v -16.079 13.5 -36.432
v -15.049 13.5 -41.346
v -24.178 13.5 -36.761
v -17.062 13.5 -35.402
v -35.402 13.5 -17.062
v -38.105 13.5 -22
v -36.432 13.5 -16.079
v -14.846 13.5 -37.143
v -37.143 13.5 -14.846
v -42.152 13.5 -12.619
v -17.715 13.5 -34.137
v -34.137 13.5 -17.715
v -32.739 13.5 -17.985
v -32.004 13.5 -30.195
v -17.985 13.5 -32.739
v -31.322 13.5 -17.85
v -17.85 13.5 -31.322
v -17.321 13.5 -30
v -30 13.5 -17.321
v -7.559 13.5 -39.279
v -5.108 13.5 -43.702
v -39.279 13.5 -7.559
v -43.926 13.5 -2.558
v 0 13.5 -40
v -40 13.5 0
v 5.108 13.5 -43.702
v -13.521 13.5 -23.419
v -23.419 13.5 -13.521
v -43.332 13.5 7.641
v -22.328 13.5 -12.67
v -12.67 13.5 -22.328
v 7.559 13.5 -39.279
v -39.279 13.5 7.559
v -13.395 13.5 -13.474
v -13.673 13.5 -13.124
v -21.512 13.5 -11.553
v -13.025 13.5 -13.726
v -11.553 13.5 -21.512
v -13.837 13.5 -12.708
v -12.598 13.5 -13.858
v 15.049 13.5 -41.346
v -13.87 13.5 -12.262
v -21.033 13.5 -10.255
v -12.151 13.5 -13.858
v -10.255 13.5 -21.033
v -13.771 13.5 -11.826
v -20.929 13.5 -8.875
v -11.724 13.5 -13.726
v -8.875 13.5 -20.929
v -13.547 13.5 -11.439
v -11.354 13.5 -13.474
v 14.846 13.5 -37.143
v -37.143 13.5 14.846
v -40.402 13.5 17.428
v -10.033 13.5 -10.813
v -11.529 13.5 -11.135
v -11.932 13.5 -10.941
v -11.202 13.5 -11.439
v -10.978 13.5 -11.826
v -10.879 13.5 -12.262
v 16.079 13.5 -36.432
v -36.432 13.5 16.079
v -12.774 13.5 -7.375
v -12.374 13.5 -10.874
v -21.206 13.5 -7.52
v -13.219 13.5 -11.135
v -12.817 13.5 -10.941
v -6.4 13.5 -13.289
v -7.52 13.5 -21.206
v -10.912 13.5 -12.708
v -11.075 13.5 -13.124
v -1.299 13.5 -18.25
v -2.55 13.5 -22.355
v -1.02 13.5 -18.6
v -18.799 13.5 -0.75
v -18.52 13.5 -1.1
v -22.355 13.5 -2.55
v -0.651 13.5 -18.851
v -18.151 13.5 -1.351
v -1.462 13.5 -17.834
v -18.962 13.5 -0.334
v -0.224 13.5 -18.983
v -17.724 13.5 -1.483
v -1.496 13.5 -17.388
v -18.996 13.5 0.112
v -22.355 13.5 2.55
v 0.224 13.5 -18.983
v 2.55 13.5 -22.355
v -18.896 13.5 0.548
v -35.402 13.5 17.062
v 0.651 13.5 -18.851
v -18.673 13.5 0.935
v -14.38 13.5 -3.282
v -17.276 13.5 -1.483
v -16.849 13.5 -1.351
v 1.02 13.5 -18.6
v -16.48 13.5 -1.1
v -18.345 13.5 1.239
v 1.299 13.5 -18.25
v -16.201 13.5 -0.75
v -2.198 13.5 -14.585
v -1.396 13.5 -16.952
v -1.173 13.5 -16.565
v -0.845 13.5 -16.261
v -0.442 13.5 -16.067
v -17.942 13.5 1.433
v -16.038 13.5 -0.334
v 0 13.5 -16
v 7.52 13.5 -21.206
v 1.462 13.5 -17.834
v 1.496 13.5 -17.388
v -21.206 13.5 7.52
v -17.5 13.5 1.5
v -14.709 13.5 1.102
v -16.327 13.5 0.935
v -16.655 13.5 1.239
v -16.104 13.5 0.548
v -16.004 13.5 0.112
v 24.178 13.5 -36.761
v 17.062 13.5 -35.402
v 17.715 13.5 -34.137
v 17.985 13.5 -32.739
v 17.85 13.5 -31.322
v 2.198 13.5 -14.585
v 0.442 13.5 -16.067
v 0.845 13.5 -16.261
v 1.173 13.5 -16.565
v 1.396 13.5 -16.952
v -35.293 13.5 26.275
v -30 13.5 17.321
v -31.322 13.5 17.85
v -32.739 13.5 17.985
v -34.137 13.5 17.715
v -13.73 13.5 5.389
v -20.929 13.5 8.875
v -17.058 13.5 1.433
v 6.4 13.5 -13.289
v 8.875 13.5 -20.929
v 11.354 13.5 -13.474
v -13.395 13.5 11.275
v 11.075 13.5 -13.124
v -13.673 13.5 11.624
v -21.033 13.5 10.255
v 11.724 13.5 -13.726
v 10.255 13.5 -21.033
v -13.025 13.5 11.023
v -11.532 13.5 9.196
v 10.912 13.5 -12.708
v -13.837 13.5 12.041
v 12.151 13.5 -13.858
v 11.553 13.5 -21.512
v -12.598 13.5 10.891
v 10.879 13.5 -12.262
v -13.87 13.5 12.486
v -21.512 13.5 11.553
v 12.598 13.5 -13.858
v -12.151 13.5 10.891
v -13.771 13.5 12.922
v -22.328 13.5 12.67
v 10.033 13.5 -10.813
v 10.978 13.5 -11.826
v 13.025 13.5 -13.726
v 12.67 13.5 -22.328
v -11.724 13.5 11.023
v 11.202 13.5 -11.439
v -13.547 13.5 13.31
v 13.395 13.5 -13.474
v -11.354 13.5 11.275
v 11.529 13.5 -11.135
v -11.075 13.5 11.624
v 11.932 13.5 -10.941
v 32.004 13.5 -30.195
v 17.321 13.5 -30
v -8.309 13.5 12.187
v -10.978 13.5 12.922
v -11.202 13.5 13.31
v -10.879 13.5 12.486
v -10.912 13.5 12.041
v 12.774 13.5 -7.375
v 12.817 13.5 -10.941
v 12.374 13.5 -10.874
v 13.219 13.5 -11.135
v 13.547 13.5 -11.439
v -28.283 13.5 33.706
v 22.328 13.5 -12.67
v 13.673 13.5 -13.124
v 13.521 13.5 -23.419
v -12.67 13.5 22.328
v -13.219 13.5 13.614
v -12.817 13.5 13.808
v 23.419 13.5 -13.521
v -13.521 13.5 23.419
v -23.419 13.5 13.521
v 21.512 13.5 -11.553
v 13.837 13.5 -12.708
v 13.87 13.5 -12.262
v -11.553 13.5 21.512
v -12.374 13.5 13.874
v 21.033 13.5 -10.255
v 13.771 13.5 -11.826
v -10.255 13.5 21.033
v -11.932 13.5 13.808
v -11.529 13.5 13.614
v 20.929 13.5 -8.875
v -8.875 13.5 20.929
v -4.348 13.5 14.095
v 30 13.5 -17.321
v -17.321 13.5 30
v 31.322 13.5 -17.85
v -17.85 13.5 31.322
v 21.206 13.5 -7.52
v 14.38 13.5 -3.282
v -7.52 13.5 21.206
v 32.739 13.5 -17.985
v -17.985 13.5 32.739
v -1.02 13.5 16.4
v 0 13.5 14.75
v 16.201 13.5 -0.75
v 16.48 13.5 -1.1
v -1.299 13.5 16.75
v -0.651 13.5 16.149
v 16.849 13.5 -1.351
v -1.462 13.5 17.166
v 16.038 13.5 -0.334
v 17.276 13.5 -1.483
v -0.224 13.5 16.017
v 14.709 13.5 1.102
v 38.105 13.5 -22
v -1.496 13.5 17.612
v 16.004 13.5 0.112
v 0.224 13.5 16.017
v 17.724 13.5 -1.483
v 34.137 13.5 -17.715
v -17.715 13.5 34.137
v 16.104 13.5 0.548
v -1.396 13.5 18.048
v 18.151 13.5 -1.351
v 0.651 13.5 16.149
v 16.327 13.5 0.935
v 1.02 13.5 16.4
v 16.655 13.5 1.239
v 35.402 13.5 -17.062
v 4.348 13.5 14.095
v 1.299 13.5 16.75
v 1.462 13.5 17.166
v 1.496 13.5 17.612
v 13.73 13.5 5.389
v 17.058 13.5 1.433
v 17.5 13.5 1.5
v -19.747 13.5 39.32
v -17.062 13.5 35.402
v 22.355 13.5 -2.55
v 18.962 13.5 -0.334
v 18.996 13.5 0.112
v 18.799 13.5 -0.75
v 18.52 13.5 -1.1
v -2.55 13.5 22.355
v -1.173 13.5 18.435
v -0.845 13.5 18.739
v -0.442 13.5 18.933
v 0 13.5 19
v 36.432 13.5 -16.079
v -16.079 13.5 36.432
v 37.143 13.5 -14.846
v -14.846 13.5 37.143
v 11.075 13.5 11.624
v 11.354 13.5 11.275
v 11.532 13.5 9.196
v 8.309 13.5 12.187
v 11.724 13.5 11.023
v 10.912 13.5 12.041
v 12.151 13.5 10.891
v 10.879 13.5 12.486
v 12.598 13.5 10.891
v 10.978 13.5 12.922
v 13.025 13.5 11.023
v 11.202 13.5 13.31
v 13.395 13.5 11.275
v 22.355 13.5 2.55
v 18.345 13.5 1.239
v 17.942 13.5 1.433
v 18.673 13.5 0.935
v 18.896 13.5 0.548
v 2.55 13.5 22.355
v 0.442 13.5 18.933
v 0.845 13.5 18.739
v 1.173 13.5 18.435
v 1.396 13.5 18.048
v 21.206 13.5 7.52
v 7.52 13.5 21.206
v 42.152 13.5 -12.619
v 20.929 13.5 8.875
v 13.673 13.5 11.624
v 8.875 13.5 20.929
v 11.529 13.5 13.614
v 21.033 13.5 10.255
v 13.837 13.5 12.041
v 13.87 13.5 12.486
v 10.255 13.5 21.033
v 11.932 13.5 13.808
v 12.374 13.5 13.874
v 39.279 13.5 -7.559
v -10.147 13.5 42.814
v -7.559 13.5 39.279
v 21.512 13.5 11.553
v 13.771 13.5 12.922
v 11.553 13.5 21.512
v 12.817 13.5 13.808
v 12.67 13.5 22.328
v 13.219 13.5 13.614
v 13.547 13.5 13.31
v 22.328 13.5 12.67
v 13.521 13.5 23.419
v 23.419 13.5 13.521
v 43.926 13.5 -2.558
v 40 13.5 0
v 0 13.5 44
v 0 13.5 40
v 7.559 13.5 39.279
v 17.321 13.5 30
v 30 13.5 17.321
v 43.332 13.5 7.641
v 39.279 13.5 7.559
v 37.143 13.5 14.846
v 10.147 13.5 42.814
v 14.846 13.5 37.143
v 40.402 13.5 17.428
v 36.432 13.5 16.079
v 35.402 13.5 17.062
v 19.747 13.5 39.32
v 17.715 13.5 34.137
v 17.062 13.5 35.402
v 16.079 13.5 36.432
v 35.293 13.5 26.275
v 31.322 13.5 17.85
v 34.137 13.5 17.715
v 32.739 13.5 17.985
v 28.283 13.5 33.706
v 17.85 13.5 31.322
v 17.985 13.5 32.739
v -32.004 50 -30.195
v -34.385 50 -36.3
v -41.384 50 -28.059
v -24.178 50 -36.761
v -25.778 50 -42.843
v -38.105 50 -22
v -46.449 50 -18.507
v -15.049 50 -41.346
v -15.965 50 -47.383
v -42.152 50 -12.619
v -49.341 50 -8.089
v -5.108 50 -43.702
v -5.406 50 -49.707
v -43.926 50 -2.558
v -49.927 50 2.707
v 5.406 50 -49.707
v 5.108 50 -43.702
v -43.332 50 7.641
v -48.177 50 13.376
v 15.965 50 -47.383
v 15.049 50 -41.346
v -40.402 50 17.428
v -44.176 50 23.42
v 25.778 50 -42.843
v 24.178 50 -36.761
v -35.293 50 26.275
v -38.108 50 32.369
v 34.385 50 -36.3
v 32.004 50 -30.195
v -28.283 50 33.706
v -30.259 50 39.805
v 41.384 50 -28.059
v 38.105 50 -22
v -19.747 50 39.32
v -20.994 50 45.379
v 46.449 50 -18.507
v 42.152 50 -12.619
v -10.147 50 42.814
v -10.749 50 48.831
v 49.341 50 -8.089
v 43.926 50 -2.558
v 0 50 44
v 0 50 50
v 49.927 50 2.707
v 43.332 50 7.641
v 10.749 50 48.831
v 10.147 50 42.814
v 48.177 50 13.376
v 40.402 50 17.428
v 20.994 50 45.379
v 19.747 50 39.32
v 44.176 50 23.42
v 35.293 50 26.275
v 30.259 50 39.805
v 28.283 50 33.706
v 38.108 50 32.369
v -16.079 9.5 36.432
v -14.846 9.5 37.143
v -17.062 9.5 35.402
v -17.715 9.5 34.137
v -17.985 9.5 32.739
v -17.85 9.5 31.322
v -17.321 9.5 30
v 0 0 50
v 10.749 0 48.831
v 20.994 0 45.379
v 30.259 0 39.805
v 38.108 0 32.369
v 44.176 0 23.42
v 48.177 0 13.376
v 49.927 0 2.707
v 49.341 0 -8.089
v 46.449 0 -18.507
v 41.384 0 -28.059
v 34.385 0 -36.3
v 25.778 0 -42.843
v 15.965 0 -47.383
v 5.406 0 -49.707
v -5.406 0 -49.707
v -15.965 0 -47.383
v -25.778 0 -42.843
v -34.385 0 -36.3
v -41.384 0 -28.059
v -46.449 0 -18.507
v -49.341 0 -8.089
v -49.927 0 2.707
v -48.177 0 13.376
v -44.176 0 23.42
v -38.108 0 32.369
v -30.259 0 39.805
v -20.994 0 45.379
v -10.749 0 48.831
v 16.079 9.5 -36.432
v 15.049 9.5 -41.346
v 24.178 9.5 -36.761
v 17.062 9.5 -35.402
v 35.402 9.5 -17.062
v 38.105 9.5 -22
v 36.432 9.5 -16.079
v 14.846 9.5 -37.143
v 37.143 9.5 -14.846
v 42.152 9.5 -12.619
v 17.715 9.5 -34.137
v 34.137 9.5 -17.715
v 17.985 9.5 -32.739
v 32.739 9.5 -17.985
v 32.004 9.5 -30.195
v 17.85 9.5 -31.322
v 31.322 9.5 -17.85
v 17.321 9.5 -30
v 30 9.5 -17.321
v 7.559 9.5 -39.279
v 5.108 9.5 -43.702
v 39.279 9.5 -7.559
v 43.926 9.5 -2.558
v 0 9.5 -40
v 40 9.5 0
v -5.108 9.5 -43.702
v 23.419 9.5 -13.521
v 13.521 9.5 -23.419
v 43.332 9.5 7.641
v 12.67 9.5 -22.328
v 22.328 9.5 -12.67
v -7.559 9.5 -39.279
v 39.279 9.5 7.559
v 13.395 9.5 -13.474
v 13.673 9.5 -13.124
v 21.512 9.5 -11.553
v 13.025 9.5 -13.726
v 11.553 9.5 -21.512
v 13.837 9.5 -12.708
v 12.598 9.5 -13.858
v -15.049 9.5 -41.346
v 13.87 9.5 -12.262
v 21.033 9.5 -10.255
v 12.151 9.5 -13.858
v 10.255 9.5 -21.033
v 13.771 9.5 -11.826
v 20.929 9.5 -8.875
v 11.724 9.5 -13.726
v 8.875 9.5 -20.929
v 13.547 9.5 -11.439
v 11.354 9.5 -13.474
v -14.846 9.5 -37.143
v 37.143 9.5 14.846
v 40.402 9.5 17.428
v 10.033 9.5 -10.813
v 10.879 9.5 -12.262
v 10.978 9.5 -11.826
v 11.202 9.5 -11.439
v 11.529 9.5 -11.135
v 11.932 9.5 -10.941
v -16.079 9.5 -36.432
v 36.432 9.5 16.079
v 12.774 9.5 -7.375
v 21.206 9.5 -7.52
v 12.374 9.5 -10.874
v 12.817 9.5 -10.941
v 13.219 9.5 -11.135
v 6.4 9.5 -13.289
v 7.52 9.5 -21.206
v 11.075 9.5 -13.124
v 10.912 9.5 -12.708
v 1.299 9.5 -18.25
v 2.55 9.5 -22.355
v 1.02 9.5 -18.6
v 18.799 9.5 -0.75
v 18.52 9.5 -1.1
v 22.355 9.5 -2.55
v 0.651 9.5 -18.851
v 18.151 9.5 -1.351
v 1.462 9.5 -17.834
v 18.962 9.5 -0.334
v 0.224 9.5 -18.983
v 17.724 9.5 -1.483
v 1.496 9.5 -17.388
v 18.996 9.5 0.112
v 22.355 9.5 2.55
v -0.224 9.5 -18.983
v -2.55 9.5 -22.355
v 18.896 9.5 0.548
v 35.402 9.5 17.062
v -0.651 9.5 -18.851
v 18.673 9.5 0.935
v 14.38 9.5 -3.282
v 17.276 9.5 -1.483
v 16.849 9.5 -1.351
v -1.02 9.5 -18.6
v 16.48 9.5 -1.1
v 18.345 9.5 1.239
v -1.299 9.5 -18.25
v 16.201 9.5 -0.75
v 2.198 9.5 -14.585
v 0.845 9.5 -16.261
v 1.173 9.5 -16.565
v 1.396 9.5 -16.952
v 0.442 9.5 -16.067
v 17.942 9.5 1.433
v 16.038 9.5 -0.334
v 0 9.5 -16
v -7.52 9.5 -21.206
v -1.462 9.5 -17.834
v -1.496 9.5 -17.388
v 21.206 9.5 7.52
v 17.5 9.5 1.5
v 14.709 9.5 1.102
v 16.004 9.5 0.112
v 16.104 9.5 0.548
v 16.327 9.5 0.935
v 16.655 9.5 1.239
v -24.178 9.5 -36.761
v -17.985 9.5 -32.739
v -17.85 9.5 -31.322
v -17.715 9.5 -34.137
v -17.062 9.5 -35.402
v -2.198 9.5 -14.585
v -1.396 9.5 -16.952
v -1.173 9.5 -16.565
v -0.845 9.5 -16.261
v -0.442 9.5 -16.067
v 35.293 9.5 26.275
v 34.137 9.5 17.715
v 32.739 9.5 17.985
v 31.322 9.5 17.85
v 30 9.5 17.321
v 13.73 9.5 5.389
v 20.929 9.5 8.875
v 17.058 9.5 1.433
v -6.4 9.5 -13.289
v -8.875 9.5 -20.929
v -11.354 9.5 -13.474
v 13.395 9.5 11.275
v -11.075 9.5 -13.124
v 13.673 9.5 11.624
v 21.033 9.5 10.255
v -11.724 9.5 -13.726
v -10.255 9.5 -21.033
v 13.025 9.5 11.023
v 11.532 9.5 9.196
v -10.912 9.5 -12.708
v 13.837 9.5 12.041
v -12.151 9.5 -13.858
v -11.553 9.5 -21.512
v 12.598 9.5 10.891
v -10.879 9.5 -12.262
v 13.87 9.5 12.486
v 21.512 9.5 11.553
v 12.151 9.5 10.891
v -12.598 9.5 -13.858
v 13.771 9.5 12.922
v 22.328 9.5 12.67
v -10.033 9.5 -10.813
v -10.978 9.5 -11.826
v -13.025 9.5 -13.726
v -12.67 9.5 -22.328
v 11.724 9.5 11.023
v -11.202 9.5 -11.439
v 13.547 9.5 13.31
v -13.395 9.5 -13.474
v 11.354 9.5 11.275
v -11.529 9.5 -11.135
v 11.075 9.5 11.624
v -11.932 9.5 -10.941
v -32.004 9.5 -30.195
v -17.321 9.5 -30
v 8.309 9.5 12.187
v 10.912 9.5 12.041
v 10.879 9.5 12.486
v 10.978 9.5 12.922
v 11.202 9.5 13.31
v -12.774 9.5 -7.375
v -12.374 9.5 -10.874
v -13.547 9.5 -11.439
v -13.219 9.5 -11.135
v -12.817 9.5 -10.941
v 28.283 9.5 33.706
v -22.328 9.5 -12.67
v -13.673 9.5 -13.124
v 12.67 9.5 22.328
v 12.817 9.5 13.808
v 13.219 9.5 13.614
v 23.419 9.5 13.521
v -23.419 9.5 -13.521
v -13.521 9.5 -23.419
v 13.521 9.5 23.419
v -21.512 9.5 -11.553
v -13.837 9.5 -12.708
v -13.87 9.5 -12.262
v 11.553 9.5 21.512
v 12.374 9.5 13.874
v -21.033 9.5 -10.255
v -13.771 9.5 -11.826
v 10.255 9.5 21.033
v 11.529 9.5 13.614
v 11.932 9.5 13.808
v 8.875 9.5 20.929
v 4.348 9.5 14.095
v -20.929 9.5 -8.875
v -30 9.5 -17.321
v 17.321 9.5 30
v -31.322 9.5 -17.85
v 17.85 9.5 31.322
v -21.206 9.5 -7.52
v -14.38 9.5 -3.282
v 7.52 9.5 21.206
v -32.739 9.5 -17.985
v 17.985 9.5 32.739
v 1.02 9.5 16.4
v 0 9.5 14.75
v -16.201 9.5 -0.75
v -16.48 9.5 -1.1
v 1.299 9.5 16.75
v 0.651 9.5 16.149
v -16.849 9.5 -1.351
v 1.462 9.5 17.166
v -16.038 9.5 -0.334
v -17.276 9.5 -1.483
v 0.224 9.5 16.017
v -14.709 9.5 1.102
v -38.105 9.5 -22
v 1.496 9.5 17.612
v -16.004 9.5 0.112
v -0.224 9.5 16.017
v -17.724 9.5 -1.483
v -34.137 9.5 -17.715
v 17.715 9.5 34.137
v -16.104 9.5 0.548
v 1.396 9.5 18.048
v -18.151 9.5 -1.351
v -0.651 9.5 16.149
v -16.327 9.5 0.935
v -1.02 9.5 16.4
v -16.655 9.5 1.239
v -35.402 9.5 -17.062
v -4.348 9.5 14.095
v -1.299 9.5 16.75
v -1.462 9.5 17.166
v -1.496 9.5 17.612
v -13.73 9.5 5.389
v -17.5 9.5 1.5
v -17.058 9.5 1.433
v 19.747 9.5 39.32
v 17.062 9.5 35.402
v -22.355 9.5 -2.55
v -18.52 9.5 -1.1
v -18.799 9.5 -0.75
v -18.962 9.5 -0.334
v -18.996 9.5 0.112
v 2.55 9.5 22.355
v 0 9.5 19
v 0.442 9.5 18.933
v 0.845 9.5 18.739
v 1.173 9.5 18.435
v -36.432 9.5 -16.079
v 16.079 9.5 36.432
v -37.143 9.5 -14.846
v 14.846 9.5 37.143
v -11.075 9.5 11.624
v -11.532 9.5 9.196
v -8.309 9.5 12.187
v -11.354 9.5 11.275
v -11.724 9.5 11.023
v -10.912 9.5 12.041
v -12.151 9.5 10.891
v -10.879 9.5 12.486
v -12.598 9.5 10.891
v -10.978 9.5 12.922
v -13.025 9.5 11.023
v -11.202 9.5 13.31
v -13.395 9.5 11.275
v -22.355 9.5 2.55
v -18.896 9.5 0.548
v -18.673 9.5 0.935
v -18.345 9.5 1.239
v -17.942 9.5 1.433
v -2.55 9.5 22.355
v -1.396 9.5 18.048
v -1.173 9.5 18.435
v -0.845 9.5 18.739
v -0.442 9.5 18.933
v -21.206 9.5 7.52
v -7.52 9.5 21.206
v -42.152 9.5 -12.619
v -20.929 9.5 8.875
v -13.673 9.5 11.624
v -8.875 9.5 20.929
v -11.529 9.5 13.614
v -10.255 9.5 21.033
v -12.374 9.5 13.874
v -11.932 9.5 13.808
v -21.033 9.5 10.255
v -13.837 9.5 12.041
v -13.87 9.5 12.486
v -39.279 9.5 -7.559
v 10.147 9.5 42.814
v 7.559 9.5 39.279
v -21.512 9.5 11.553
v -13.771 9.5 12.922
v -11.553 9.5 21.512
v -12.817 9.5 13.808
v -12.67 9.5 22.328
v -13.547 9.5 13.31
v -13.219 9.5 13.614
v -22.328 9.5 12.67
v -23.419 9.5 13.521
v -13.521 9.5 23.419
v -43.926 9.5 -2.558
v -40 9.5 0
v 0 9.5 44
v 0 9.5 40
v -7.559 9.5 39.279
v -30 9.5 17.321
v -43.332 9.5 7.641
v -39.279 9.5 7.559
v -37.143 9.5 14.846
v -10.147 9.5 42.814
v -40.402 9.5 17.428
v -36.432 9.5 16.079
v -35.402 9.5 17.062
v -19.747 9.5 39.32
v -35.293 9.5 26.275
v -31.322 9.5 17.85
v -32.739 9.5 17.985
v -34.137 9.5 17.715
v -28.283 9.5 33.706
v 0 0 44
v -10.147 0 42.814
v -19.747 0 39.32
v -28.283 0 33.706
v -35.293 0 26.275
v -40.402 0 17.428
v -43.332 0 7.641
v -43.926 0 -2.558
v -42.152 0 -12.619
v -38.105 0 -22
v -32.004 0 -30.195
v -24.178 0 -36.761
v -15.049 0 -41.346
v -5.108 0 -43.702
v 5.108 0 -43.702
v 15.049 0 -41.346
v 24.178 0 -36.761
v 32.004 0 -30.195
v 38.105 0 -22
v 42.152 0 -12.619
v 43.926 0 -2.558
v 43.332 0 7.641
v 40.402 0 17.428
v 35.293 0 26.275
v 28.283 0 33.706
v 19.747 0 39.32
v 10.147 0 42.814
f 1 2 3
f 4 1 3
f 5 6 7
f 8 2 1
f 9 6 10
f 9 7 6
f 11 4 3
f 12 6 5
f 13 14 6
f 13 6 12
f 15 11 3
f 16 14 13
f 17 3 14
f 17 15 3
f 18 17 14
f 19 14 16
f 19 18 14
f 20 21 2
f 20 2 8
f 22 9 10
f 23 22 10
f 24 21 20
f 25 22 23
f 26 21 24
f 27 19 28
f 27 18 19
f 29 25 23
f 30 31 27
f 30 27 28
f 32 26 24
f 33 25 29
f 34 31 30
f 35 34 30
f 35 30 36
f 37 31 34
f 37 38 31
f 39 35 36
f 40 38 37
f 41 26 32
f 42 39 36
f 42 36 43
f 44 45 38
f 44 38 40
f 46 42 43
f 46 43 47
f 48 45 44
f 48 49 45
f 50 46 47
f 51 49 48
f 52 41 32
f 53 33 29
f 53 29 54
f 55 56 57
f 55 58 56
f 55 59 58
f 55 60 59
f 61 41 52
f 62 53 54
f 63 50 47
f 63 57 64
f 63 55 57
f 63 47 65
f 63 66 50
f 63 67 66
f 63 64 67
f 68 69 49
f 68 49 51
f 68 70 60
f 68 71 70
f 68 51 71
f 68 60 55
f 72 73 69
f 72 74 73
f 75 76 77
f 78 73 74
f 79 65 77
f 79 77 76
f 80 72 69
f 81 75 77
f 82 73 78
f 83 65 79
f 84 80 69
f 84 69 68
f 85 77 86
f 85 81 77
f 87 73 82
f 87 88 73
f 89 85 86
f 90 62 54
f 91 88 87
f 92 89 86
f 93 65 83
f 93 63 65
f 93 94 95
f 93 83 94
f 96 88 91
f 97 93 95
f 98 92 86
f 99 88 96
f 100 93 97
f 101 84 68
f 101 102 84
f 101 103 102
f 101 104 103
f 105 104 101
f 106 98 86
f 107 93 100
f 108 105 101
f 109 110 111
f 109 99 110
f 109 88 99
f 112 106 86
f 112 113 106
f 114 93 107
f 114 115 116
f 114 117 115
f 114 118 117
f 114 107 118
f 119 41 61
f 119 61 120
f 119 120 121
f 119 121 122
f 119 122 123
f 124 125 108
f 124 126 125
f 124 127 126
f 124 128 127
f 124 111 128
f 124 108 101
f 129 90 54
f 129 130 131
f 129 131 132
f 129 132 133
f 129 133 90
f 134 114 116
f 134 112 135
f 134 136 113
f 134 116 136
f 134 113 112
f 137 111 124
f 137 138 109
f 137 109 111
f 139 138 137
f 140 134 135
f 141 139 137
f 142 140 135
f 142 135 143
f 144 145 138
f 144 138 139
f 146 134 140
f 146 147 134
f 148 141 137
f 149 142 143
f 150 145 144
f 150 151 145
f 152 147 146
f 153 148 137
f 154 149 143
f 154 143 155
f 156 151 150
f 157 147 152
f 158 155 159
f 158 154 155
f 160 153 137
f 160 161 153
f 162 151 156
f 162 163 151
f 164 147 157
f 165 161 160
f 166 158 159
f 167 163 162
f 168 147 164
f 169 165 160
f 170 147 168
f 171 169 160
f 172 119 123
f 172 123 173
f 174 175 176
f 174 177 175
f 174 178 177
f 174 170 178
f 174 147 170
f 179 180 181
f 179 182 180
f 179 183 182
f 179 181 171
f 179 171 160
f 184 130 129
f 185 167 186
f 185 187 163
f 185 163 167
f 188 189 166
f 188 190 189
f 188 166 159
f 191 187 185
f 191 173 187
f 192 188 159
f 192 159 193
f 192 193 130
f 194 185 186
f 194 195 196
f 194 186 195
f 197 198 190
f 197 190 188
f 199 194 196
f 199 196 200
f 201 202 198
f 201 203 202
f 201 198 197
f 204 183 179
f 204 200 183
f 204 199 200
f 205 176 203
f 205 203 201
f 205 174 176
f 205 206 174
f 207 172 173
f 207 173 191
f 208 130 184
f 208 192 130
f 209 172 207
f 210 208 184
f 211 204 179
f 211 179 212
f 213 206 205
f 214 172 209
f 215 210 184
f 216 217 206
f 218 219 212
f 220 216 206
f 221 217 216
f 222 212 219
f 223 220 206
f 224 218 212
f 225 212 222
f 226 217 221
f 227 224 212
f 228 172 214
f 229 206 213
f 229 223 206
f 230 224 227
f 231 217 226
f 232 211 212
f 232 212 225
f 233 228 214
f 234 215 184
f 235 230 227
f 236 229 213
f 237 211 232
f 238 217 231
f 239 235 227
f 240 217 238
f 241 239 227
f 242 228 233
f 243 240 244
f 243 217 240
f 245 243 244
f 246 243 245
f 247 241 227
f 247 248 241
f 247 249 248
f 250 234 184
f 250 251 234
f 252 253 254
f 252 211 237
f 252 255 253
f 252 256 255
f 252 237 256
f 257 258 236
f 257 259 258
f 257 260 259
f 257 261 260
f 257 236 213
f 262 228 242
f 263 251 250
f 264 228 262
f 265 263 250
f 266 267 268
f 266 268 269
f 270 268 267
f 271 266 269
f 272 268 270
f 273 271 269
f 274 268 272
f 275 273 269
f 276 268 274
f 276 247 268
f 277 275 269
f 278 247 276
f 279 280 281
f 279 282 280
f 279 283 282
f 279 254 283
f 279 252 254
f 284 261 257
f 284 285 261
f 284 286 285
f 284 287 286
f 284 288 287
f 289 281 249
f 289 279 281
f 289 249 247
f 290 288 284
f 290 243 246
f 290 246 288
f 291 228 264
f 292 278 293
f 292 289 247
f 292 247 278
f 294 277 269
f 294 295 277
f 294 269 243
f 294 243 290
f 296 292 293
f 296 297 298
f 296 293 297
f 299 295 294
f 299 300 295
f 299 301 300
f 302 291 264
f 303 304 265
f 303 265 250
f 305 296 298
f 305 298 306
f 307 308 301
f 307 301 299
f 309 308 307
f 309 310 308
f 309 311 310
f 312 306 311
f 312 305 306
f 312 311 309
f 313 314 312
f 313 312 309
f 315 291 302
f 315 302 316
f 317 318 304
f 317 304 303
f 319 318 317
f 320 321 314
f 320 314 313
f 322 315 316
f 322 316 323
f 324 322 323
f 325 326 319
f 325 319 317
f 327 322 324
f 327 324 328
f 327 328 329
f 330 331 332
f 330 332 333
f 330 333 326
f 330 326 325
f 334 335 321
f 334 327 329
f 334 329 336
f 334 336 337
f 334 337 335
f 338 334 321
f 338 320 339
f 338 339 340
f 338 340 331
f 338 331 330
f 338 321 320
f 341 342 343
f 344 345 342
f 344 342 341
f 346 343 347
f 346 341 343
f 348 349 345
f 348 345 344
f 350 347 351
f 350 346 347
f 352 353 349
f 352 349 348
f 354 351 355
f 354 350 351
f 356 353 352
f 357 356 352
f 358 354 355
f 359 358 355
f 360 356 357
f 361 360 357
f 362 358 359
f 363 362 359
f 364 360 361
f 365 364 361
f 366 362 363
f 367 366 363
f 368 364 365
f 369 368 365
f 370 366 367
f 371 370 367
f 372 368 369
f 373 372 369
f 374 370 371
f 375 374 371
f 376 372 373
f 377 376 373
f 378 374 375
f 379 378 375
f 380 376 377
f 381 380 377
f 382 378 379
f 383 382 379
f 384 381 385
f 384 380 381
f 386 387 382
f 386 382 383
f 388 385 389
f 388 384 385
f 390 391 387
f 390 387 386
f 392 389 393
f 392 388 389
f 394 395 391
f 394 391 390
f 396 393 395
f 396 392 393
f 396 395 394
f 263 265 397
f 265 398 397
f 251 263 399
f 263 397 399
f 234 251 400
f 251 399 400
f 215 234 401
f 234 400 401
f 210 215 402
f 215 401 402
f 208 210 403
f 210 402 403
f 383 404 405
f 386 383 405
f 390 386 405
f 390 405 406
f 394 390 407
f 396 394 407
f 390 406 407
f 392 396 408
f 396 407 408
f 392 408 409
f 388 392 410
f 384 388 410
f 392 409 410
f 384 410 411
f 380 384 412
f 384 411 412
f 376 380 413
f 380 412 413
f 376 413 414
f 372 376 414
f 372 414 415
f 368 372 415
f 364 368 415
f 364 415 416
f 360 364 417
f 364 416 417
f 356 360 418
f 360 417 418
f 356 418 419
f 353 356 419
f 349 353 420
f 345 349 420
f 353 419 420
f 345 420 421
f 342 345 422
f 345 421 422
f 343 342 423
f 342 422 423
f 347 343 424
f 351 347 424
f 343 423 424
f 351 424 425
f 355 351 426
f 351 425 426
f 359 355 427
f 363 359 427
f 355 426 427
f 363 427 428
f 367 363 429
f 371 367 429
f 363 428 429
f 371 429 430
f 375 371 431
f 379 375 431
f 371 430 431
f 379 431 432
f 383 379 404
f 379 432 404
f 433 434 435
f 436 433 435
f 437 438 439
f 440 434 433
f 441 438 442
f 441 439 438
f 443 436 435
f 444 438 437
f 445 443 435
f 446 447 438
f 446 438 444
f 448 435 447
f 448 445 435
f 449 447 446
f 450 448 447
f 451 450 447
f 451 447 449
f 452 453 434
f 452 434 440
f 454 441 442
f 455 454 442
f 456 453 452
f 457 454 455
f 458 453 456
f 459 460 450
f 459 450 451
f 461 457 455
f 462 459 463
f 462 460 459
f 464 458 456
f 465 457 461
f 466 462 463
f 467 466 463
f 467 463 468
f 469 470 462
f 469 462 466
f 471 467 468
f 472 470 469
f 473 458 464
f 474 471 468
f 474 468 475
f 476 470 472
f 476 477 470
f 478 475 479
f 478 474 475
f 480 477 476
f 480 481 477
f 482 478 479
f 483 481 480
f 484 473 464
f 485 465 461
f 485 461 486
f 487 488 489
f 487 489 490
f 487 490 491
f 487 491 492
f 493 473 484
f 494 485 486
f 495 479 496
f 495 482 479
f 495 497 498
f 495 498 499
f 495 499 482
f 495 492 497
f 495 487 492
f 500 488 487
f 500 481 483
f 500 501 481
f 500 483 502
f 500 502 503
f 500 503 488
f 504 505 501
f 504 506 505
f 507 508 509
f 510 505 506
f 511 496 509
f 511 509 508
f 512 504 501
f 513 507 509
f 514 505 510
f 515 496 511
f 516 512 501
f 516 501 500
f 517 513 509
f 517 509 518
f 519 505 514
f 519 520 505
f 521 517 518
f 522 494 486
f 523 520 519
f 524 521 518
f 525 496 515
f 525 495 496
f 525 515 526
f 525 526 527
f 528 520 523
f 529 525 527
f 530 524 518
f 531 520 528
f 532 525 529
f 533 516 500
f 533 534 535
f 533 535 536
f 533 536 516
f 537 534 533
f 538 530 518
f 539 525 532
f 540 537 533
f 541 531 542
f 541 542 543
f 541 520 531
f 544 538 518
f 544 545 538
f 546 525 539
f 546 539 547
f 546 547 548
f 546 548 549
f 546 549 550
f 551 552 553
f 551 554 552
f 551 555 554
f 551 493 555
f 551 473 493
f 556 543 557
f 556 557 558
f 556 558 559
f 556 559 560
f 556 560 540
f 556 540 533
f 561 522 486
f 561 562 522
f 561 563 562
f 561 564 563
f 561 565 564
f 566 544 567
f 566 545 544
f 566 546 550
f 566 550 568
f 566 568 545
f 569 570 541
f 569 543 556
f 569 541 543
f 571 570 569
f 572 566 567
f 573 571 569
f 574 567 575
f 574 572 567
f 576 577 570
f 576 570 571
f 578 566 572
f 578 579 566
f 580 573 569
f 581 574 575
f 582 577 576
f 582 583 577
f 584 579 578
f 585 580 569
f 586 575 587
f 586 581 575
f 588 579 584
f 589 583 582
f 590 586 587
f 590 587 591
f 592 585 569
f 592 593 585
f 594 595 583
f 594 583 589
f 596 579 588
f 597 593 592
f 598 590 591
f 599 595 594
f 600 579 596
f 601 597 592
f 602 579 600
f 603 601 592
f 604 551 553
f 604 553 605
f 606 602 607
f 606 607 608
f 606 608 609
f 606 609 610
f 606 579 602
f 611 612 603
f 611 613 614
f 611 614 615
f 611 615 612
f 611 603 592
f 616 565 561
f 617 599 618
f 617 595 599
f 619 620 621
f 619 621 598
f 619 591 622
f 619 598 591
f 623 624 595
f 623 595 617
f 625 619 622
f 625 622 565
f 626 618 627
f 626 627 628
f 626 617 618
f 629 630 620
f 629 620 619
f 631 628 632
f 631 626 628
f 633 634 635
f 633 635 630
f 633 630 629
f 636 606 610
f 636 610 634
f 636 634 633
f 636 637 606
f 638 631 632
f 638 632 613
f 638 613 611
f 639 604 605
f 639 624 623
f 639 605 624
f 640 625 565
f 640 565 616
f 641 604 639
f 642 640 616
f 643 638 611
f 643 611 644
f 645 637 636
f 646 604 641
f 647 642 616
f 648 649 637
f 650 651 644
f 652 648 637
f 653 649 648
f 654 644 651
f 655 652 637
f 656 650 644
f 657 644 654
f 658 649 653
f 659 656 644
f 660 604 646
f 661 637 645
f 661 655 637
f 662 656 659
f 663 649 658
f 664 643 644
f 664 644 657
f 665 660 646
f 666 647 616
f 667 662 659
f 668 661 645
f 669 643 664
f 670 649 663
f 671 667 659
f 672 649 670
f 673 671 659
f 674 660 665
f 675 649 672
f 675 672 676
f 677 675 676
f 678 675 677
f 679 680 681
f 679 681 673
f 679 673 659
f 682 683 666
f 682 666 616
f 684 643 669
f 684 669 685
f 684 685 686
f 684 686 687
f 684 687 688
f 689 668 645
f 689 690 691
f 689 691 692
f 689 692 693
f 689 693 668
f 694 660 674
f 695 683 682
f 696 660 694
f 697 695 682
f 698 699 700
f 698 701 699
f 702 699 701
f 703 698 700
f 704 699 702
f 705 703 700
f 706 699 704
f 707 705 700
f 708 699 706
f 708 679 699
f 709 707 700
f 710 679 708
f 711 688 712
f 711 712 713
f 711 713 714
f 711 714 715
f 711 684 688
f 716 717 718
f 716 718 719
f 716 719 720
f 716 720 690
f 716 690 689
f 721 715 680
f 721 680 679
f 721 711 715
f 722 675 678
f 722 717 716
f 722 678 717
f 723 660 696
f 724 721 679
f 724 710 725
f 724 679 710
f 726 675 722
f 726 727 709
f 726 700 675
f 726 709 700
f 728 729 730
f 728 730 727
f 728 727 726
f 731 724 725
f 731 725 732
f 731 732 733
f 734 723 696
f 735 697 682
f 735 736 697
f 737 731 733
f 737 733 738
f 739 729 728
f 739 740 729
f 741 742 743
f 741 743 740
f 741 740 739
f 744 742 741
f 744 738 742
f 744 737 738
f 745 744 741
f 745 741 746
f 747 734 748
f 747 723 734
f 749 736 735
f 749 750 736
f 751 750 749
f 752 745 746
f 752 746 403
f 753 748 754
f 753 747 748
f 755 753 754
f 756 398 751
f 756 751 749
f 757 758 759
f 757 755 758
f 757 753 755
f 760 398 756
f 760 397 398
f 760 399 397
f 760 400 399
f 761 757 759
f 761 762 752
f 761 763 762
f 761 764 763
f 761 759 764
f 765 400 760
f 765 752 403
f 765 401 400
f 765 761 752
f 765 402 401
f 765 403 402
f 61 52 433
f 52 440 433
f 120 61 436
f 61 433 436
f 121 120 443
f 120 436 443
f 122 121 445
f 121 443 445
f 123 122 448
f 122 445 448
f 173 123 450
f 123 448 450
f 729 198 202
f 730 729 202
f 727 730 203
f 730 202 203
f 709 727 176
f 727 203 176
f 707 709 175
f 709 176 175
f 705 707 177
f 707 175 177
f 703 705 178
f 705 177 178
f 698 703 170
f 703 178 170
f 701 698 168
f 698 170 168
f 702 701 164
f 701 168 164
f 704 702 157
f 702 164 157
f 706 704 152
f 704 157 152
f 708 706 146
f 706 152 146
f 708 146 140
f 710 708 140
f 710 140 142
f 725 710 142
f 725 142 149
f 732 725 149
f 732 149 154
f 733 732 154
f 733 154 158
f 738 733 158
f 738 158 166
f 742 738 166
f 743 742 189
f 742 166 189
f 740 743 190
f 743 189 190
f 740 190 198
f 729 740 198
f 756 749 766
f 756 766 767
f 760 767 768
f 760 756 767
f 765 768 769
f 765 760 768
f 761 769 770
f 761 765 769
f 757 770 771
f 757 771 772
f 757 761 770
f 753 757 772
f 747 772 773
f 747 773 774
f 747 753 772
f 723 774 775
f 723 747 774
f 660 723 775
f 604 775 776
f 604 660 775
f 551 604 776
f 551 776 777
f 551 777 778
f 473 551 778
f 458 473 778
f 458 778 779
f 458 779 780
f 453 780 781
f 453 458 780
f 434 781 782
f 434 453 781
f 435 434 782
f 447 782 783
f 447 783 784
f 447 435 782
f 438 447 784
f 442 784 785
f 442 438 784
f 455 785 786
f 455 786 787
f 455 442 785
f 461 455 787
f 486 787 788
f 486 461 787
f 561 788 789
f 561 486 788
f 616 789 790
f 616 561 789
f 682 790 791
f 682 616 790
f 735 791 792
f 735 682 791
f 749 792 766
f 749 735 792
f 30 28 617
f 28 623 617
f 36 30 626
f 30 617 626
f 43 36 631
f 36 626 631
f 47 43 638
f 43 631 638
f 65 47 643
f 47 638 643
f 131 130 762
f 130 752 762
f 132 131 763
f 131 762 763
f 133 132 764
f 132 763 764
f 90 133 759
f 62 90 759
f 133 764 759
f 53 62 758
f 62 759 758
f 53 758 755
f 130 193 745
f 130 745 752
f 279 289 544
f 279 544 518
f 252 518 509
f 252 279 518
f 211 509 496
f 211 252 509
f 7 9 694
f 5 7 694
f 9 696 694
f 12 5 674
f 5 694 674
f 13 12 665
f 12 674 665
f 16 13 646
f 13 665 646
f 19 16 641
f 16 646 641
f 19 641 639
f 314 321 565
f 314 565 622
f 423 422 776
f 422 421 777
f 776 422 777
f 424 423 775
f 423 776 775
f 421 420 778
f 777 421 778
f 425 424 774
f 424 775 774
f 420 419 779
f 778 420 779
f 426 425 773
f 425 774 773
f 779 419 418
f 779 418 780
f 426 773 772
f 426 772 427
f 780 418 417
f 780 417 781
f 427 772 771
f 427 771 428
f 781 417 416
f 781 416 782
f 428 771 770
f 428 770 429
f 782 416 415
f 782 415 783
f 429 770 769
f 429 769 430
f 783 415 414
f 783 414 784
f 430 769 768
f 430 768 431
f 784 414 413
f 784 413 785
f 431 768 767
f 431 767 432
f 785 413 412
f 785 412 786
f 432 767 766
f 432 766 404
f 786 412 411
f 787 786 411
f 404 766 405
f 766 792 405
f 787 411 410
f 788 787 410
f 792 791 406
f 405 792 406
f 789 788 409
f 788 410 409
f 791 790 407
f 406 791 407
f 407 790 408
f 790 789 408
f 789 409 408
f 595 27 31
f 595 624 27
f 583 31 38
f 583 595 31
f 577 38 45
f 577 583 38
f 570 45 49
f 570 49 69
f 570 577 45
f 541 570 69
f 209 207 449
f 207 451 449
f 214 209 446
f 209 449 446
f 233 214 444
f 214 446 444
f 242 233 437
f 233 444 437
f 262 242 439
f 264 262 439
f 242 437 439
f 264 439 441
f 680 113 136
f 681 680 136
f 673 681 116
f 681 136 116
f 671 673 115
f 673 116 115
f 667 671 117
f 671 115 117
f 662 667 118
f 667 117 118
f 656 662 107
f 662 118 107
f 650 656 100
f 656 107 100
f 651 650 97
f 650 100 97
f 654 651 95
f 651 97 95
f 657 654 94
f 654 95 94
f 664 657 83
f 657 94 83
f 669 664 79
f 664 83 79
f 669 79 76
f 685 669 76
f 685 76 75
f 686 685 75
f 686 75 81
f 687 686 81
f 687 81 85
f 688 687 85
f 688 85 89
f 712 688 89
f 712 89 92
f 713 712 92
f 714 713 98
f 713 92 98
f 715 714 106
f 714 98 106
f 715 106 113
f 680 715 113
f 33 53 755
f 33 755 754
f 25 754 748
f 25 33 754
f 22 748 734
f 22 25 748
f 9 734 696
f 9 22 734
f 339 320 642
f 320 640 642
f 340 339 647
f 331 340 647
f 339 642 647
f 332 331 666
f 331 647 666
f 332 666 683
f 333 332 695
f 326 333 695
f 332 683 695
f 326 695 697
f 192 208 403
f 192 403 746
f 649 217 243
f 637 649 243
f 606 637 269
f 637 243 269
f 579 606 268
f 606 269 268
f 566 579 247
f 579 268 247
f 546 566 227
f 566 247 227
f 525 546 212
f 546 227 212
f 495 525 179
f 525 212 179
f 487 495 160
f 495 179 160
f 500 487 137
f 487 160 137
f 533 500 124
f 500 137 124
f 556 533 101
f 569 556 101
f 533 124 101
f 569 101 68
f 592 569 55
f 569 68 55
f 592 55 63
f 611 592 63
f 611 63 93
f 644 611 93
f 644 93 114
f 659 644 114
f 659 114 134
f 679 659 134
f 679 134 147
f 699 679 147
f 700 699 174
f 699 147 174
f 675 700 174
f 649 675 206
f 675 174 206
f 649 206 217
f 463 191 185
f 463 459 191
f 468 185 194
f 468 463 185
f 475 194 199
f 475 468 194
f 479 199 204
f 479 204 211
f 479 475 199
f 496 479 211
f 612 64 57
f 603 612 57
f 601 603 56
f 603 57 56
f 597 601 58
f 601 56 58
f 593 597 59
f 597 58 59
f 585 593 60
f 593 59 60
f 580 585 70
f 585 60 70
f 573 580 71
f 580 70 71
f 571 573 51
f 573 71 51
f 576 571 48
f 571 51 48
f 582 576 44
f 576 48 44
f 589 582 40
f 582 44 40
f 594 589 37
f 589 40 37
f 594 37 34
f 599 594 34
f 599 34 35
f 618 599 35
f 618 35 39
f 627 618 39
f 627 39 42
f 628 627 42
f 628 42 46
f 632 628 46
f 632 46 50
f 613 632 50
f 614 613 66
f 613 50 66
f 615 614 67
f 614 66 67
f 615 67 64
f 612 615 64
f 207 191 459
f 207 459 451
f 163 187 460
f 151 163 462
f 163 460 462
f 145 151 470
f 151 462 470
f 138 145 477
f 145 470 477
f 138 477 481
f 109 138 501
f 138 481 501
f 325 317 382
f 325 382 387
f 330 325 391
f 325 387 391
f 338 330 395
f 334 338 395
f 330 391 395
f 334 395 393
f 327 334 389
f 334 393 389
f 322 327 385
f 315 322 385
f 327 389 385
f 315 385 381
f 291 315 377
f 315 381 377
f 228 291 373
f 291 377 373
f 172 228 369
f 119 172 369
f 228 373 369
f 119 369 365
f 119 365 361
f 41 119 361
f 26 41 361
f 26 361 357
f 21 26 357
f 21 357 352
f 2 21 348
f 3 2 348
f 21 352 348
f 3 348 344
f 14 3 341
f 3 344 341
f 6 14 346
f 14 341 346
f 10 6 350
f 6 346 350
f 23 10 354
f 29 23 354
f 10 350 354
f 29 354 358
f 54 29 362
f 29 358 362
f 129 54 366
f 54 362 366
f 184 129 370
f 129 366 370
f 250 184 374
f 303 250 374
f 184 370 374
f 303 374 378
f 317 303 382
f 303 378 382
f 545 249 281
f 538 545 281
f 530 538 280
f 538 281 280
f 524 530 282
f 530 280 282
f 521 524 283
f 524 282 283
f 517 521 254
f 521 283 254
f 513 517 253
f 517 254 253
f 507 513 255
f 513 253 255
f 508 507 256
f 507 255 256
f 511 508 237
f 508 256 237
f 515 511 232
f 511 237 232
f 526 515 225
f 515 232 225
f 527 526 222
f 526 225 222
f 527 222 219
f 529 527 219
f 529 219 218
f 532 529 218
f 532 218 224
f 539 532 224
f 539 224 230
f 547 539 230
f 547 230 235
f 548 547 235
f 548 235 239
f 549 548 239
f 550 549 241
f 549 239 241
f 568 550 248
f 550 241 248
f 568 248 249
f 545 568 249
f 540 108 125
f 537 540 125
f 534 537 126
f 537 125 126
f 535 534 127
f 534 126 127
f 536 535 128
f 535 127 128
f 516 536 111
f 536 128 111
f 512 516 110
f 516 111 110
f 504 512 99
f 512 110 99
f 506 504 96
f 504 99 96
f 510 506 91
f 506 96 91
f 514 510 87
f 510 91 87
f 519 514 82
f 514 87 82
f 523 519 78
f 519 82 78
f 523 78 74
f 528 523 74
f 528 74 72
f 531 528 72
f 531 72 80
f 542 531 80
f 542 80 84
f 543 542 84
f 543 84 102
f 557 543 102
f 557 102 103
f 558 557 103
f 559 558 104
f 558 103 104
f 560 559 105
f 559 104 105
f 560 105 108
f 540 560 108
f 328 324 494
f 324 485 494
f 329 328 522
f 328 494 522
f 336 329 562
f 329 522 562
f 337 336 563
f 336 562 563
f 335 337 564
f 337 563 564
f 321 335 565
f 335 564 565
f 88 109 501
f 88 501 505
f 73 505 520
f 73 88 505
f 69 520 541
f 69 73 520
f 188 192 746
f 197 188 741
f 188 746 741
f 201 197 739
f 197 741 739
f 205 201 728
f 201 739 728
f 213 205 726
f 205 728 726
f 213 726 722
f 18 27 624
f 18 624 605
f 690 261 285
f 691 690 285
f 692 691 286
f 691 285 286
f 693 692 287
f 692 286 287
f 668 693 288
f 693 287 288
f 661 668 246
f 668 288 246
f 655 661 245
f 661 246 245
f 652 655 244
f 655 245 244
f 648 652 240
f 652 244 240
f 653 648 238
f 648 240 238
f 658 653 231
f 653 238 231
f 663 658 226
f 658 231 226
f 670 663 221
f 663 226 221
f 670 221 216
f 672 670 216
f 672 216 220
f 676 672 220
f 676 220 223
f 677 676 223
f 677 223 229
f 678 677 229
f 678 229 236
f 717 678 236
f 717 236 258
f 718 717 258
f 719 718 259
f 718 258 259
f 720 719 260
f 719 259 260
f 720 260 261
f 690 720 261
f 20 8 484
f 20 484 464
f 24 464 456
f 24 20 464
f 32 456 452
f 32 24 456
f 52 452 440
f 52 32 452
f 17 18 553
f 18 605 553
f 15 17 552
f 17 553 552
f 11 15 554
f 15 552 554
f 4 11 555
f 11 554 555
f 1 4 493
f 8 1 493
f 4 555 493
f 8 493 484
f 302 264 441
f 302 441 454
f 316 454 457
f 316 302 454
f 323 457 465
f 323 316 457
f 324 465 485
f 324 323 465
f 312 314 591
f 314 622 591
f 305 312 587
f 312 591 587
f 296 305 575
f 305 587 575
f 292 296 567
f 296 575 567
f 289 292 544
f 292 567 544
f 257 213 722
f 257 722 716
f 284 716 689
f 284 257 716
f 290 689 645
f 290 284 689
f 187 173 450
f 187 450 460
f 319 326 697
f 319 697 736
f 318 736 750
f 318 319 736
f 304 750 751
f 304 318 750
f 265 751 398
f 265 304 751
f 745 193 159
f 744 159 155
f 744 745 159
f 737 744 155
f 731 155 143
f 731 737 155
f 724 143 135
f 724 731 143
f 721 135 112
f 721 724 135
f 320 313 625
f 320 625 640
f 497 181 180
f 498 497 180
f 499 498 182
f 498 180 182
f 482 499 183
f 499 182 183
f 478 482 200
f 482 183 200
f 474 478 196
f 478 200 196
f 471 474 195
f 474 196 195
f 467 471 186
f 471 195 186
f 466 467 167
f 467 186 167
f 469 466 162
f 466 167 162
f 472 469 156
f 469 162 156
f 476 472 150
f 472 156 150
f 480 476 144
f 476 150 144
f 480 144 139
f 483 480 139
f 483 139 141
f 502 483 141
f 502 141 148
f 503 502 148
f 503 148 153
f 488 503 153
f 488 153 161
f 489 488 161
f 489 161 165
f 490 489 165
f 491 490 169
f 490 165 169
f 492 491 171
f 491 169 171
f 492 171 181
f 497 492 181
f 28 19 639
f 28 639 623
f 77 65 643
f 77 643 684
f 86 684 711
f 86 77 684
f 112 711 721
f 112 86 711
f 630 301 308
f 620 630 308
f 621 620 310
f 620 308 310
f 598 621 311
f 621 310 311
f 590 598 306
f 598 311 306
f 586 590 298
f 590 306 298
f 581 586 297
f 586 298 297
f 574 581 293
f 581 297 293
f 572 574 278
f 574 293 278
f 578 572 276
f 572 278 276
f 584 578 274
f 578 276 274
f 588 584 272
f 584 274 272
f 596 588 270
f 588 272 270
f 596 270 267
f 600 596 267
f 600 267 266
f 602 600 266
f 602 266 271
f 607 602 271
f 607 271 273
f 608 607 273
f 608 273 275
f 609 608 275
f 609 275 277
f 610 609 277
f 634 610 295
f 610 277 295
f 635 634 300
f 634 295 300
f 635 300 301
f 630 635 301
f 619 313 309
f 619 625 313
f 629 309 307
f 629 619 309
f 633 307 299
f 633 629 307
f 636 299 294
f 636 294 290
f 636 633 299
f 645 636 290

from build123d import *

# Parameters (mm, degrees)
SKETCH_1_R          = 50
EXTRUDE_1_DEPTH     = 50
SKETCH_2_R          = 44
CUT_EXTRUDE_1_DEPTH = 36.5
CUT_EXTRUDE_START   = -9.5
SKETCH_3_R          = 44
CUT_EXTRUDE_2_DEPTH = 9.5
SKETCH_4_R          = 14.75
SKETCH_4_R_2        = 1.5
CUT_EXTRUDE_3_DEPTH = 4
CUT_EXTRUDE_4_DEPTH = 4
FILLET_1_R          = 5


with BuildPart() as part:
    # 草图1 → 凸台-拉伸1 (new body)
    with BuildSketch(Plane(origin=(0, 0, 0), x_dir=(1, 0, 0), z_dir=(0, 1, 0))):
        with Locations(Location((0, 0, 0), (0, 0, 270))):
            Circle(SKETCH_1_R)
    extrude(amount=EXTRUDE_1_DEPTH)

    # 草图2 → 切除-拉伸1 (cut)
    with BuildSketch(Plane(origin=(0, 50, 0), x_dir=(1, 0, 0), z_dir=(0, 1, 0))):
        with Locations(Location((0, 0, 0), (0, 0, 270))):
            Circle(SKETCH_2_R)
    extrude(amount=-CUT_EXTRUDE_1_DEPTH, mode=Mode.SUBTRACT)

    # 草图3 → 切除-拉伸2 (cut)
    with BuildSketch(Plane.XZ.offset(CUT_EXTRUDE_START)):
        with Locations(Location((0, 0, 0), (0, 0, 90))):
            Circle(SKETCH_3_R)
    extrude(amount=CUT_EXTRUDE_2_DEPTH, mode=Mode.SUBTRACT)

    # 草图4 → 切除-拉伸3 (cut)
    with BuildSketch(Plane(origin=(0, 13.5, 0), x_dir=(1, 0, 0), z_dir=(0, 1, 0))):
        with Locations(Location((0, 0, 0), (0, 0, 270))):
            Circle(SKETCH_4_R)
        with Locations(Location((0, 17.5, 0), (0, 0, 270))):
            Circle(SKETCH_4_R_2)
        with Locations(Location((12.374368671, 12.374368671, 0), (0, 0, 270))):
            Circle(SKETCH_4_R_2)
        with Locations(Location((17.5, 0, 0), (0, 0, 270))):
            Circle(SKETCH_4_R_2)
        with Locations(Location((12.374368671, -12.374368671, 0), (0, 0, 270))):
            Circle(SKETCH_4_R_2)
        with Locations(Location((0, -17.5, 0), (0, 0, 270))):
            Circle(SKETCH_4_R_2)
        with Locations(Location((-12.374368671, -12.374368671, 0), (0, 0, 270))):
            Circle(SKETCH_4_R_2)
        with Locations(Location((-17.5, 0, 0), (0, 0, 270))):
            Circle(SKETCH_4_R_2)
        with Locations(Location((-12.374368671, 12.374368671, 0), (0, 0, 270))):
            Circle(SKETCH_4_R_2)
    extrude(amount=-CUT_EXTRUDE_3_DEPTH, mode=Mode.SUBTRACT)

    # 草图8 → 切除-拉伸4 (cut)
    with BuildSketch(Plane(origin=(0, 13.5, 0), x_dir=(1, 0, 0), z_dir=(0, 1, 0))):
        with BuildLine():
            Line((-11.25, 19.485571585), (-20, 34.641016151))
            ThreePointArc((-20, 34.641016151), (0, 40), (20, 34.641016151))
            Line((20, 34.641016151), (11.25, 19.485571585))
            ThreePointArc((11.25, 19.485571585), (0, 22.5), (-11.25, 19.485571585))
        make_face()
        with BuildLine():
            Line((19.485571585, 11.25), (34.641016151, 20))
            ThreePointArc((34.641016151, 20), (40, 0), (34.641016151, -20))
            Line((34.641016151, -20), (19.485571585, -11.25))
            ThreePointArc((19.485571585, -11.25), (22.5, 0), (19.485571585, 11.25))
        make_face()
        with BuildLine():
            Line((11.25, -19.485571585), (20, -34.641016151))
            ThreePointArc((20, -34.641016151), (0, -40), (-20, -34.641016151))
            Line((-20, -34.641016151), (-11.25, -19.485571585))
            ThreePointArc((-11.25, -19.485571585), (0, -22.5), (11.25, -19.485571585))
        make_face()
        with BuildLine():
            Line((-19.485571585, -11.25), (-34.641016151, -20))
            ThreePointArc((-34.641016151, -20), (-40, 0), (-34.641016151, 20))
            Line((-34.641016151, 20), (-19.485571585, 11.25))
            ThreePointArc((-19.485571585, 11.25), (-22.5, 0), (-19.485571585, -11.25))
        make_face()
    extrude(amount=-CUT_EXTRUDE_4_DEPTH, mode=Mode.SUBTRACT)

    # 圆角1
    fillet_1_edges = [part.edges().sort_by_distance(p)[0] for p in [
        (-11.25, 11.5, 19.485571585),
        (11.25, 11.5, 19.485571585),
        (20, 11.5, 34.641016151),
        (-20, 11.5, 34.641016151),
        (19.485571585, 11.5, 11.25),
        (19.485571585, 11.5, -11.25),
        (34.641016151, 11.5, -20),
        (34.641016151, 11.5, 20),
        (-19.485571585, 11.5, -11.25),
        (-19.485571585, 11.5, 11.25),
        (-34.641016151, 11.5, 20),
        (-34.641016151, 11.5, -20),
        (11.25, 11.5, -19.485571585),
        (-11.25, 11.5, -19.485571585),
        (-20, 11.5, -34.641016151),
        (20, 11.5, -34.641016151),
    ]]
    fillet(fillet_1_edges, radius=FILLET_1_R)


solid = part.part
